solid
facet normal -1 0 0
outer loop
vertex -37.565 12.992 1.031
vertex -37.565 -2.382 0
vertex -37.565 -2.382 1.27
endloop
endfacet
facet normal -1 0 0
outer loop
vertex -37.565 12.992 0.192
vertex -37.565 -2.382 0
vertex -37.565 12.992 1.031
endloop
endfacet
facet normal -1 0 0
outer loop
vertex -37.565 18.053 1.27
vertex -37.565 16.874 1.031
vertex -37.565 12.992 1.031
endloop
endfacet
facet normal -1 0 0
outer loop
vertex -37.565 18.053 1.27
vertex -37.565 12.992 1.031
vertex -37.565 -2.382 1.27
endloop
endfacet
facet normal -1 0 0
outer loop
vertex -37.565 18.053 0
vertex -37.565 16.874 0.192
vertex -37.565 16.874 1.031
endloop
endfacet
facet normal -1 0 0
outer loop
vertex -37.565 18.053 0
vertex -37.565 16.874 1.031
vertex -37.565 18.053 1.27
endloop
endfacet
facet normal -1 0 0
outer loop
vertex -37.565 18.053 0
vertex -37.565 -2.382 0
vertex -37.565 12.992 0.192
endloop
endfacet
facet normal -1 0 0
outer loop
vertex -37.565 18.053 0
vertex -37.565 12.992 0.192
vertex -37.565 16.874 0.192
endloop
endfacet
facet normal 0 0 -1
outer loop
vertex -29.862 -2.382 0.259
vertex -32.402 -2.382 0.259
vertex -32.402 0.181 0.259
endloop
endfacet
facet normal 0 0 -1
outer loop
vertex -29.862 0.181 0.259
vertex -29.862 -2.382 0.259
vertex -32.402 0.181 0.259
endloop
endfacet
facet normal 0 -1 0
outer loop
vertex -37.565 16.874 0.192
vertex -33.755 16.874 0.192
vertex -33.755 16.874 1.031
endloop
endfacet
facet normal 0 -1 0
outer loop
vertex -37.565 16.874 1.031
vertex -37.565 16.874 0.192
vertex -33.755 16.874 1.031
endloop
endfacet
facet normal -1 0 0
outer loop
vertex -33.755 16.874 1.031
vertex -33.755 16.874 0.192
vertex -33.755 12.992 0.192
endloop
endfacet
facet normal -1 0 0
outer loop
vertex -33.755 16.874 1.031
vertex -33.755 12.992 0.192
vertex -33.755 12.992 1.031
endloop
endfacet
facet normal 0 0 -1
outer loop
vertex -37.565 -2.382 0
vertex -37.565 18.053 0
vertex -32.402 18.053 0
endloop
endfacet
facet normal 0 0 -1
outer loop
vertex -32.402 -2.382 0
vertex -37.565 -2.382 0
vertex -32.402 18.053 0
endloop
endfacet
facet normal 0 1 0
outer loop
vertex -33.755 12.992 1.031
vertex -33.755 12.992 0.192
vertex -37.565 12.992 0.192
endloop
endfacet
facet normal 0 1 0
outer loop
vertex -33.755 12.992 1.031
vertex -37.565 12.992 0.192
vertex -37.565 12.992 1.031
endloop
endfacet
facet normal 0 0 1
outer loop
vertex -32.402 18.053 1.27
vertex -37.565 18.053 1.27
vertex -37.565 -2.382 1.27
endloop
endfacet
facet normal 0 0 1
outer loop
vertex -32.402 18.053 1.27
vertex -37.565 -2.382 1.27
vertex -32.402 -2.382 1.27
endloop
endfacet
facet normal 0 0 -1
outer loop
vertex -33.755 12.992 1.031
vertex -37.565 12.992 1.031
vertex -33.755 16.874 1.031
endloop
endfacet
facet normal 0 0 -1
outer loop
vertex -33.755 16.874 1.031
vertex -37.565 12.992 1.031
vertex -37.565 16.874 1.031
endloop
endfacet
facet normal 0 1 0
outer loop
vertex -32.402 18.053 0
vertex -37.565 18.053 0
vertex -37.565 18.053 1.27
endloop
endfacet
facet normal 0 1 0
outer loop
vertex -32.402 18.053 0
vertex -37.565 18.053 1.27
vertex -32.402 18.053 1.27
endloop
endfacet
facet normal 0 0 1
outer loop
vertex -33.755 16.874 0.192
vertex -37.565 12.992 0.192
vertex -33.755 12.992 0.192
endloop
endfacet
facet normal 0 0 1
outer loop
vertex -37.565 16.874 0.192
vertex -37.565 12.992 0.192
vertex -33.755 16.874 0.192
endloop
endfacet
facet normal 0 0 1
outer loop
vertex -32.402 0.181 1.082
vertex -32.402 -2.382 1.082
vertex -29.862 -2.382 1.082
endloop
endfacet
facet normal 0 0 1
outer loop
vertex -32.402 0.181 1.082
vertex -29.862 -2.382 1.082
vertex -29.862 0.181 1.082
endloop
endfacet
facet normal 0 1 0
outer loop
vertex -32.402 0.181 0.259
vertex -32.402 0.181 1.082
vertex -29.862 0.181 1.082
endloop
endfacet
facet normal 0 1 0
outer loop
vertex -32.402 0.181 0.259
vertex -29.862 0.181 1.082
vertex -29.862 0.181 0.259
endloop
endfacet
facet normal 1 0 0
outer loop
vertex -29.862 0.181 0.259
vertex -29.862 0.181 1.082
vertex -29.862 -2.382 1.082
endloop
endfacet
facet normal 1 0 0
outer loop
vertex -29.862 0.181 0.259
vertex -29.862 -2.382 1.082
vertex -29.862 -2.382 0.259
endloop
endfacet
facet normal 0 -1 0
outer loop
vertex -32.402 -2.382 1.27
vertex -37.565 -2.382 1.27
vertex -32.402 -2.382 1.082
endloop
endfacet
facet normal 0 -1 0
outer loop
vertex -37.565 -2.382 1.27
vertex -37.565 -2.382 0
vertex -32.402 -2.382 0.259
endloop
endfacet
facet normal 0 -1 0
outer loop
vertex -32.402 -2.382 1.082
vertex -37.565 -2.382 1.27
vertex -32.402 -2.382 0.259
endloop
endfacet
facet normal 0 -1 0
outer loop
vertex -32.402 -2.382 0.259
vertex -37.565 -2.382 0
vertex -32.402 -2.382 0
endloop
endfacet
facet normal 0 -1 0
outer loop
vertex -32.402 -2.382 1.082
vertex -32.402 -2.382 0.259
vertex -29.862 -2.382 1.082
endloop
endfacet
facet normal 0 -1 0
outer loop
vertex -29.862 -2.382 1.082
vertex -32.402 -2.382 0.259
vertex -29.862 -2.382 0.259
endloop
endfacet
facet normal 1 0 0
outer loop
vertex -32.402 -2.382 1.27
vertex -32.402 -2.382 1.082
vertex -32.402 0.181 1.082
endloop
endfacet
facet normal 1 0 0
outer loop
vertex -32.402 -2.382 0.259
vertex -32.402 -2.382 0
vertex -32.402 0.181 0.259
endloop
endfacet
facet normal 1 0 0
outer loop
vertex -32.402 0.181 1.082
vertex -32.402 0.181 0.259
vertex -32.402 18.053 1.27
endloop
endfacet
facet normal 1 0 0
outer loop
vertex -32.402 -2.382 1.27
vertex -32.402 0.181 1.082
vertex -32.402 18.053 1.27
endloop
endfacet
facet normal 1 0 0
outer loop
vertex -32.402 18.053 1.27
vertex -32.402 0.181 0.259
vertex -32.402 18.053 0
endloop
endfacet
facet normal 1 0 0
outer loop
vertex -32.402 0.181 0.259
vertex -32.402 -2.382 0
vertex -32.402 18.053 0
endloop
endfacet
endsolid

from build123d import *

# Parameters (mm, degrees)
SKETCH1_W           = 5.162383308
SKETCH1_H           = 20.435052184
BOSS_EXTRUDE1_DEPTH = 1.27
SKETCH2_W           = 0.838933851
SKETCH2_H           = 3.882140463
CUT_EXTRUDE1_DEPTH  = 3.81
SKETCH3_W           = 0.823014711
SKETCH3_H           = 2.56348928
BOSS_EXTRUDE2_DEPTH = 2.54


with BuildPart() as part:
    # Sketch1 → Boss-Extrude1 (new body)
    with BuildSketch(Plane.XY):
        with Locations((-34.98361032, 7.835499756)):
            Rectangle(SKETCH1_W, SKETCH1_H)
    extrude(amount=BOSS_EXTRUDE1_DEPTH)

    # Sketch2 → Cut-Extrude1 (cut)
    with BuildSketch(Plane.ZY.offset(37.564801974)):
        with Locations((0.611191145, 14.932897959)):
            Rectangle(SKETCH2_W, SKETCH2_H)
    extrude(amount=-CUT_EXTRUDE1_DEPTH, mode=Mode.SUBTRACT)

    # Sketch3 → Boss-Extrude2 (add)
    with BuildSketch(Plane(origin=(-32.402418666, 0, 0), x_dir=(0, 0, -1), z_dir=(1, 0, 0))):
        with Locations((-0.670761293, -1.100281696)):
            Rectangle(SKETCH3_W, SKETCH3_H)
    extrude(amount=BOSS_EXTRUDE2_DEPTH)


solid = part.part
